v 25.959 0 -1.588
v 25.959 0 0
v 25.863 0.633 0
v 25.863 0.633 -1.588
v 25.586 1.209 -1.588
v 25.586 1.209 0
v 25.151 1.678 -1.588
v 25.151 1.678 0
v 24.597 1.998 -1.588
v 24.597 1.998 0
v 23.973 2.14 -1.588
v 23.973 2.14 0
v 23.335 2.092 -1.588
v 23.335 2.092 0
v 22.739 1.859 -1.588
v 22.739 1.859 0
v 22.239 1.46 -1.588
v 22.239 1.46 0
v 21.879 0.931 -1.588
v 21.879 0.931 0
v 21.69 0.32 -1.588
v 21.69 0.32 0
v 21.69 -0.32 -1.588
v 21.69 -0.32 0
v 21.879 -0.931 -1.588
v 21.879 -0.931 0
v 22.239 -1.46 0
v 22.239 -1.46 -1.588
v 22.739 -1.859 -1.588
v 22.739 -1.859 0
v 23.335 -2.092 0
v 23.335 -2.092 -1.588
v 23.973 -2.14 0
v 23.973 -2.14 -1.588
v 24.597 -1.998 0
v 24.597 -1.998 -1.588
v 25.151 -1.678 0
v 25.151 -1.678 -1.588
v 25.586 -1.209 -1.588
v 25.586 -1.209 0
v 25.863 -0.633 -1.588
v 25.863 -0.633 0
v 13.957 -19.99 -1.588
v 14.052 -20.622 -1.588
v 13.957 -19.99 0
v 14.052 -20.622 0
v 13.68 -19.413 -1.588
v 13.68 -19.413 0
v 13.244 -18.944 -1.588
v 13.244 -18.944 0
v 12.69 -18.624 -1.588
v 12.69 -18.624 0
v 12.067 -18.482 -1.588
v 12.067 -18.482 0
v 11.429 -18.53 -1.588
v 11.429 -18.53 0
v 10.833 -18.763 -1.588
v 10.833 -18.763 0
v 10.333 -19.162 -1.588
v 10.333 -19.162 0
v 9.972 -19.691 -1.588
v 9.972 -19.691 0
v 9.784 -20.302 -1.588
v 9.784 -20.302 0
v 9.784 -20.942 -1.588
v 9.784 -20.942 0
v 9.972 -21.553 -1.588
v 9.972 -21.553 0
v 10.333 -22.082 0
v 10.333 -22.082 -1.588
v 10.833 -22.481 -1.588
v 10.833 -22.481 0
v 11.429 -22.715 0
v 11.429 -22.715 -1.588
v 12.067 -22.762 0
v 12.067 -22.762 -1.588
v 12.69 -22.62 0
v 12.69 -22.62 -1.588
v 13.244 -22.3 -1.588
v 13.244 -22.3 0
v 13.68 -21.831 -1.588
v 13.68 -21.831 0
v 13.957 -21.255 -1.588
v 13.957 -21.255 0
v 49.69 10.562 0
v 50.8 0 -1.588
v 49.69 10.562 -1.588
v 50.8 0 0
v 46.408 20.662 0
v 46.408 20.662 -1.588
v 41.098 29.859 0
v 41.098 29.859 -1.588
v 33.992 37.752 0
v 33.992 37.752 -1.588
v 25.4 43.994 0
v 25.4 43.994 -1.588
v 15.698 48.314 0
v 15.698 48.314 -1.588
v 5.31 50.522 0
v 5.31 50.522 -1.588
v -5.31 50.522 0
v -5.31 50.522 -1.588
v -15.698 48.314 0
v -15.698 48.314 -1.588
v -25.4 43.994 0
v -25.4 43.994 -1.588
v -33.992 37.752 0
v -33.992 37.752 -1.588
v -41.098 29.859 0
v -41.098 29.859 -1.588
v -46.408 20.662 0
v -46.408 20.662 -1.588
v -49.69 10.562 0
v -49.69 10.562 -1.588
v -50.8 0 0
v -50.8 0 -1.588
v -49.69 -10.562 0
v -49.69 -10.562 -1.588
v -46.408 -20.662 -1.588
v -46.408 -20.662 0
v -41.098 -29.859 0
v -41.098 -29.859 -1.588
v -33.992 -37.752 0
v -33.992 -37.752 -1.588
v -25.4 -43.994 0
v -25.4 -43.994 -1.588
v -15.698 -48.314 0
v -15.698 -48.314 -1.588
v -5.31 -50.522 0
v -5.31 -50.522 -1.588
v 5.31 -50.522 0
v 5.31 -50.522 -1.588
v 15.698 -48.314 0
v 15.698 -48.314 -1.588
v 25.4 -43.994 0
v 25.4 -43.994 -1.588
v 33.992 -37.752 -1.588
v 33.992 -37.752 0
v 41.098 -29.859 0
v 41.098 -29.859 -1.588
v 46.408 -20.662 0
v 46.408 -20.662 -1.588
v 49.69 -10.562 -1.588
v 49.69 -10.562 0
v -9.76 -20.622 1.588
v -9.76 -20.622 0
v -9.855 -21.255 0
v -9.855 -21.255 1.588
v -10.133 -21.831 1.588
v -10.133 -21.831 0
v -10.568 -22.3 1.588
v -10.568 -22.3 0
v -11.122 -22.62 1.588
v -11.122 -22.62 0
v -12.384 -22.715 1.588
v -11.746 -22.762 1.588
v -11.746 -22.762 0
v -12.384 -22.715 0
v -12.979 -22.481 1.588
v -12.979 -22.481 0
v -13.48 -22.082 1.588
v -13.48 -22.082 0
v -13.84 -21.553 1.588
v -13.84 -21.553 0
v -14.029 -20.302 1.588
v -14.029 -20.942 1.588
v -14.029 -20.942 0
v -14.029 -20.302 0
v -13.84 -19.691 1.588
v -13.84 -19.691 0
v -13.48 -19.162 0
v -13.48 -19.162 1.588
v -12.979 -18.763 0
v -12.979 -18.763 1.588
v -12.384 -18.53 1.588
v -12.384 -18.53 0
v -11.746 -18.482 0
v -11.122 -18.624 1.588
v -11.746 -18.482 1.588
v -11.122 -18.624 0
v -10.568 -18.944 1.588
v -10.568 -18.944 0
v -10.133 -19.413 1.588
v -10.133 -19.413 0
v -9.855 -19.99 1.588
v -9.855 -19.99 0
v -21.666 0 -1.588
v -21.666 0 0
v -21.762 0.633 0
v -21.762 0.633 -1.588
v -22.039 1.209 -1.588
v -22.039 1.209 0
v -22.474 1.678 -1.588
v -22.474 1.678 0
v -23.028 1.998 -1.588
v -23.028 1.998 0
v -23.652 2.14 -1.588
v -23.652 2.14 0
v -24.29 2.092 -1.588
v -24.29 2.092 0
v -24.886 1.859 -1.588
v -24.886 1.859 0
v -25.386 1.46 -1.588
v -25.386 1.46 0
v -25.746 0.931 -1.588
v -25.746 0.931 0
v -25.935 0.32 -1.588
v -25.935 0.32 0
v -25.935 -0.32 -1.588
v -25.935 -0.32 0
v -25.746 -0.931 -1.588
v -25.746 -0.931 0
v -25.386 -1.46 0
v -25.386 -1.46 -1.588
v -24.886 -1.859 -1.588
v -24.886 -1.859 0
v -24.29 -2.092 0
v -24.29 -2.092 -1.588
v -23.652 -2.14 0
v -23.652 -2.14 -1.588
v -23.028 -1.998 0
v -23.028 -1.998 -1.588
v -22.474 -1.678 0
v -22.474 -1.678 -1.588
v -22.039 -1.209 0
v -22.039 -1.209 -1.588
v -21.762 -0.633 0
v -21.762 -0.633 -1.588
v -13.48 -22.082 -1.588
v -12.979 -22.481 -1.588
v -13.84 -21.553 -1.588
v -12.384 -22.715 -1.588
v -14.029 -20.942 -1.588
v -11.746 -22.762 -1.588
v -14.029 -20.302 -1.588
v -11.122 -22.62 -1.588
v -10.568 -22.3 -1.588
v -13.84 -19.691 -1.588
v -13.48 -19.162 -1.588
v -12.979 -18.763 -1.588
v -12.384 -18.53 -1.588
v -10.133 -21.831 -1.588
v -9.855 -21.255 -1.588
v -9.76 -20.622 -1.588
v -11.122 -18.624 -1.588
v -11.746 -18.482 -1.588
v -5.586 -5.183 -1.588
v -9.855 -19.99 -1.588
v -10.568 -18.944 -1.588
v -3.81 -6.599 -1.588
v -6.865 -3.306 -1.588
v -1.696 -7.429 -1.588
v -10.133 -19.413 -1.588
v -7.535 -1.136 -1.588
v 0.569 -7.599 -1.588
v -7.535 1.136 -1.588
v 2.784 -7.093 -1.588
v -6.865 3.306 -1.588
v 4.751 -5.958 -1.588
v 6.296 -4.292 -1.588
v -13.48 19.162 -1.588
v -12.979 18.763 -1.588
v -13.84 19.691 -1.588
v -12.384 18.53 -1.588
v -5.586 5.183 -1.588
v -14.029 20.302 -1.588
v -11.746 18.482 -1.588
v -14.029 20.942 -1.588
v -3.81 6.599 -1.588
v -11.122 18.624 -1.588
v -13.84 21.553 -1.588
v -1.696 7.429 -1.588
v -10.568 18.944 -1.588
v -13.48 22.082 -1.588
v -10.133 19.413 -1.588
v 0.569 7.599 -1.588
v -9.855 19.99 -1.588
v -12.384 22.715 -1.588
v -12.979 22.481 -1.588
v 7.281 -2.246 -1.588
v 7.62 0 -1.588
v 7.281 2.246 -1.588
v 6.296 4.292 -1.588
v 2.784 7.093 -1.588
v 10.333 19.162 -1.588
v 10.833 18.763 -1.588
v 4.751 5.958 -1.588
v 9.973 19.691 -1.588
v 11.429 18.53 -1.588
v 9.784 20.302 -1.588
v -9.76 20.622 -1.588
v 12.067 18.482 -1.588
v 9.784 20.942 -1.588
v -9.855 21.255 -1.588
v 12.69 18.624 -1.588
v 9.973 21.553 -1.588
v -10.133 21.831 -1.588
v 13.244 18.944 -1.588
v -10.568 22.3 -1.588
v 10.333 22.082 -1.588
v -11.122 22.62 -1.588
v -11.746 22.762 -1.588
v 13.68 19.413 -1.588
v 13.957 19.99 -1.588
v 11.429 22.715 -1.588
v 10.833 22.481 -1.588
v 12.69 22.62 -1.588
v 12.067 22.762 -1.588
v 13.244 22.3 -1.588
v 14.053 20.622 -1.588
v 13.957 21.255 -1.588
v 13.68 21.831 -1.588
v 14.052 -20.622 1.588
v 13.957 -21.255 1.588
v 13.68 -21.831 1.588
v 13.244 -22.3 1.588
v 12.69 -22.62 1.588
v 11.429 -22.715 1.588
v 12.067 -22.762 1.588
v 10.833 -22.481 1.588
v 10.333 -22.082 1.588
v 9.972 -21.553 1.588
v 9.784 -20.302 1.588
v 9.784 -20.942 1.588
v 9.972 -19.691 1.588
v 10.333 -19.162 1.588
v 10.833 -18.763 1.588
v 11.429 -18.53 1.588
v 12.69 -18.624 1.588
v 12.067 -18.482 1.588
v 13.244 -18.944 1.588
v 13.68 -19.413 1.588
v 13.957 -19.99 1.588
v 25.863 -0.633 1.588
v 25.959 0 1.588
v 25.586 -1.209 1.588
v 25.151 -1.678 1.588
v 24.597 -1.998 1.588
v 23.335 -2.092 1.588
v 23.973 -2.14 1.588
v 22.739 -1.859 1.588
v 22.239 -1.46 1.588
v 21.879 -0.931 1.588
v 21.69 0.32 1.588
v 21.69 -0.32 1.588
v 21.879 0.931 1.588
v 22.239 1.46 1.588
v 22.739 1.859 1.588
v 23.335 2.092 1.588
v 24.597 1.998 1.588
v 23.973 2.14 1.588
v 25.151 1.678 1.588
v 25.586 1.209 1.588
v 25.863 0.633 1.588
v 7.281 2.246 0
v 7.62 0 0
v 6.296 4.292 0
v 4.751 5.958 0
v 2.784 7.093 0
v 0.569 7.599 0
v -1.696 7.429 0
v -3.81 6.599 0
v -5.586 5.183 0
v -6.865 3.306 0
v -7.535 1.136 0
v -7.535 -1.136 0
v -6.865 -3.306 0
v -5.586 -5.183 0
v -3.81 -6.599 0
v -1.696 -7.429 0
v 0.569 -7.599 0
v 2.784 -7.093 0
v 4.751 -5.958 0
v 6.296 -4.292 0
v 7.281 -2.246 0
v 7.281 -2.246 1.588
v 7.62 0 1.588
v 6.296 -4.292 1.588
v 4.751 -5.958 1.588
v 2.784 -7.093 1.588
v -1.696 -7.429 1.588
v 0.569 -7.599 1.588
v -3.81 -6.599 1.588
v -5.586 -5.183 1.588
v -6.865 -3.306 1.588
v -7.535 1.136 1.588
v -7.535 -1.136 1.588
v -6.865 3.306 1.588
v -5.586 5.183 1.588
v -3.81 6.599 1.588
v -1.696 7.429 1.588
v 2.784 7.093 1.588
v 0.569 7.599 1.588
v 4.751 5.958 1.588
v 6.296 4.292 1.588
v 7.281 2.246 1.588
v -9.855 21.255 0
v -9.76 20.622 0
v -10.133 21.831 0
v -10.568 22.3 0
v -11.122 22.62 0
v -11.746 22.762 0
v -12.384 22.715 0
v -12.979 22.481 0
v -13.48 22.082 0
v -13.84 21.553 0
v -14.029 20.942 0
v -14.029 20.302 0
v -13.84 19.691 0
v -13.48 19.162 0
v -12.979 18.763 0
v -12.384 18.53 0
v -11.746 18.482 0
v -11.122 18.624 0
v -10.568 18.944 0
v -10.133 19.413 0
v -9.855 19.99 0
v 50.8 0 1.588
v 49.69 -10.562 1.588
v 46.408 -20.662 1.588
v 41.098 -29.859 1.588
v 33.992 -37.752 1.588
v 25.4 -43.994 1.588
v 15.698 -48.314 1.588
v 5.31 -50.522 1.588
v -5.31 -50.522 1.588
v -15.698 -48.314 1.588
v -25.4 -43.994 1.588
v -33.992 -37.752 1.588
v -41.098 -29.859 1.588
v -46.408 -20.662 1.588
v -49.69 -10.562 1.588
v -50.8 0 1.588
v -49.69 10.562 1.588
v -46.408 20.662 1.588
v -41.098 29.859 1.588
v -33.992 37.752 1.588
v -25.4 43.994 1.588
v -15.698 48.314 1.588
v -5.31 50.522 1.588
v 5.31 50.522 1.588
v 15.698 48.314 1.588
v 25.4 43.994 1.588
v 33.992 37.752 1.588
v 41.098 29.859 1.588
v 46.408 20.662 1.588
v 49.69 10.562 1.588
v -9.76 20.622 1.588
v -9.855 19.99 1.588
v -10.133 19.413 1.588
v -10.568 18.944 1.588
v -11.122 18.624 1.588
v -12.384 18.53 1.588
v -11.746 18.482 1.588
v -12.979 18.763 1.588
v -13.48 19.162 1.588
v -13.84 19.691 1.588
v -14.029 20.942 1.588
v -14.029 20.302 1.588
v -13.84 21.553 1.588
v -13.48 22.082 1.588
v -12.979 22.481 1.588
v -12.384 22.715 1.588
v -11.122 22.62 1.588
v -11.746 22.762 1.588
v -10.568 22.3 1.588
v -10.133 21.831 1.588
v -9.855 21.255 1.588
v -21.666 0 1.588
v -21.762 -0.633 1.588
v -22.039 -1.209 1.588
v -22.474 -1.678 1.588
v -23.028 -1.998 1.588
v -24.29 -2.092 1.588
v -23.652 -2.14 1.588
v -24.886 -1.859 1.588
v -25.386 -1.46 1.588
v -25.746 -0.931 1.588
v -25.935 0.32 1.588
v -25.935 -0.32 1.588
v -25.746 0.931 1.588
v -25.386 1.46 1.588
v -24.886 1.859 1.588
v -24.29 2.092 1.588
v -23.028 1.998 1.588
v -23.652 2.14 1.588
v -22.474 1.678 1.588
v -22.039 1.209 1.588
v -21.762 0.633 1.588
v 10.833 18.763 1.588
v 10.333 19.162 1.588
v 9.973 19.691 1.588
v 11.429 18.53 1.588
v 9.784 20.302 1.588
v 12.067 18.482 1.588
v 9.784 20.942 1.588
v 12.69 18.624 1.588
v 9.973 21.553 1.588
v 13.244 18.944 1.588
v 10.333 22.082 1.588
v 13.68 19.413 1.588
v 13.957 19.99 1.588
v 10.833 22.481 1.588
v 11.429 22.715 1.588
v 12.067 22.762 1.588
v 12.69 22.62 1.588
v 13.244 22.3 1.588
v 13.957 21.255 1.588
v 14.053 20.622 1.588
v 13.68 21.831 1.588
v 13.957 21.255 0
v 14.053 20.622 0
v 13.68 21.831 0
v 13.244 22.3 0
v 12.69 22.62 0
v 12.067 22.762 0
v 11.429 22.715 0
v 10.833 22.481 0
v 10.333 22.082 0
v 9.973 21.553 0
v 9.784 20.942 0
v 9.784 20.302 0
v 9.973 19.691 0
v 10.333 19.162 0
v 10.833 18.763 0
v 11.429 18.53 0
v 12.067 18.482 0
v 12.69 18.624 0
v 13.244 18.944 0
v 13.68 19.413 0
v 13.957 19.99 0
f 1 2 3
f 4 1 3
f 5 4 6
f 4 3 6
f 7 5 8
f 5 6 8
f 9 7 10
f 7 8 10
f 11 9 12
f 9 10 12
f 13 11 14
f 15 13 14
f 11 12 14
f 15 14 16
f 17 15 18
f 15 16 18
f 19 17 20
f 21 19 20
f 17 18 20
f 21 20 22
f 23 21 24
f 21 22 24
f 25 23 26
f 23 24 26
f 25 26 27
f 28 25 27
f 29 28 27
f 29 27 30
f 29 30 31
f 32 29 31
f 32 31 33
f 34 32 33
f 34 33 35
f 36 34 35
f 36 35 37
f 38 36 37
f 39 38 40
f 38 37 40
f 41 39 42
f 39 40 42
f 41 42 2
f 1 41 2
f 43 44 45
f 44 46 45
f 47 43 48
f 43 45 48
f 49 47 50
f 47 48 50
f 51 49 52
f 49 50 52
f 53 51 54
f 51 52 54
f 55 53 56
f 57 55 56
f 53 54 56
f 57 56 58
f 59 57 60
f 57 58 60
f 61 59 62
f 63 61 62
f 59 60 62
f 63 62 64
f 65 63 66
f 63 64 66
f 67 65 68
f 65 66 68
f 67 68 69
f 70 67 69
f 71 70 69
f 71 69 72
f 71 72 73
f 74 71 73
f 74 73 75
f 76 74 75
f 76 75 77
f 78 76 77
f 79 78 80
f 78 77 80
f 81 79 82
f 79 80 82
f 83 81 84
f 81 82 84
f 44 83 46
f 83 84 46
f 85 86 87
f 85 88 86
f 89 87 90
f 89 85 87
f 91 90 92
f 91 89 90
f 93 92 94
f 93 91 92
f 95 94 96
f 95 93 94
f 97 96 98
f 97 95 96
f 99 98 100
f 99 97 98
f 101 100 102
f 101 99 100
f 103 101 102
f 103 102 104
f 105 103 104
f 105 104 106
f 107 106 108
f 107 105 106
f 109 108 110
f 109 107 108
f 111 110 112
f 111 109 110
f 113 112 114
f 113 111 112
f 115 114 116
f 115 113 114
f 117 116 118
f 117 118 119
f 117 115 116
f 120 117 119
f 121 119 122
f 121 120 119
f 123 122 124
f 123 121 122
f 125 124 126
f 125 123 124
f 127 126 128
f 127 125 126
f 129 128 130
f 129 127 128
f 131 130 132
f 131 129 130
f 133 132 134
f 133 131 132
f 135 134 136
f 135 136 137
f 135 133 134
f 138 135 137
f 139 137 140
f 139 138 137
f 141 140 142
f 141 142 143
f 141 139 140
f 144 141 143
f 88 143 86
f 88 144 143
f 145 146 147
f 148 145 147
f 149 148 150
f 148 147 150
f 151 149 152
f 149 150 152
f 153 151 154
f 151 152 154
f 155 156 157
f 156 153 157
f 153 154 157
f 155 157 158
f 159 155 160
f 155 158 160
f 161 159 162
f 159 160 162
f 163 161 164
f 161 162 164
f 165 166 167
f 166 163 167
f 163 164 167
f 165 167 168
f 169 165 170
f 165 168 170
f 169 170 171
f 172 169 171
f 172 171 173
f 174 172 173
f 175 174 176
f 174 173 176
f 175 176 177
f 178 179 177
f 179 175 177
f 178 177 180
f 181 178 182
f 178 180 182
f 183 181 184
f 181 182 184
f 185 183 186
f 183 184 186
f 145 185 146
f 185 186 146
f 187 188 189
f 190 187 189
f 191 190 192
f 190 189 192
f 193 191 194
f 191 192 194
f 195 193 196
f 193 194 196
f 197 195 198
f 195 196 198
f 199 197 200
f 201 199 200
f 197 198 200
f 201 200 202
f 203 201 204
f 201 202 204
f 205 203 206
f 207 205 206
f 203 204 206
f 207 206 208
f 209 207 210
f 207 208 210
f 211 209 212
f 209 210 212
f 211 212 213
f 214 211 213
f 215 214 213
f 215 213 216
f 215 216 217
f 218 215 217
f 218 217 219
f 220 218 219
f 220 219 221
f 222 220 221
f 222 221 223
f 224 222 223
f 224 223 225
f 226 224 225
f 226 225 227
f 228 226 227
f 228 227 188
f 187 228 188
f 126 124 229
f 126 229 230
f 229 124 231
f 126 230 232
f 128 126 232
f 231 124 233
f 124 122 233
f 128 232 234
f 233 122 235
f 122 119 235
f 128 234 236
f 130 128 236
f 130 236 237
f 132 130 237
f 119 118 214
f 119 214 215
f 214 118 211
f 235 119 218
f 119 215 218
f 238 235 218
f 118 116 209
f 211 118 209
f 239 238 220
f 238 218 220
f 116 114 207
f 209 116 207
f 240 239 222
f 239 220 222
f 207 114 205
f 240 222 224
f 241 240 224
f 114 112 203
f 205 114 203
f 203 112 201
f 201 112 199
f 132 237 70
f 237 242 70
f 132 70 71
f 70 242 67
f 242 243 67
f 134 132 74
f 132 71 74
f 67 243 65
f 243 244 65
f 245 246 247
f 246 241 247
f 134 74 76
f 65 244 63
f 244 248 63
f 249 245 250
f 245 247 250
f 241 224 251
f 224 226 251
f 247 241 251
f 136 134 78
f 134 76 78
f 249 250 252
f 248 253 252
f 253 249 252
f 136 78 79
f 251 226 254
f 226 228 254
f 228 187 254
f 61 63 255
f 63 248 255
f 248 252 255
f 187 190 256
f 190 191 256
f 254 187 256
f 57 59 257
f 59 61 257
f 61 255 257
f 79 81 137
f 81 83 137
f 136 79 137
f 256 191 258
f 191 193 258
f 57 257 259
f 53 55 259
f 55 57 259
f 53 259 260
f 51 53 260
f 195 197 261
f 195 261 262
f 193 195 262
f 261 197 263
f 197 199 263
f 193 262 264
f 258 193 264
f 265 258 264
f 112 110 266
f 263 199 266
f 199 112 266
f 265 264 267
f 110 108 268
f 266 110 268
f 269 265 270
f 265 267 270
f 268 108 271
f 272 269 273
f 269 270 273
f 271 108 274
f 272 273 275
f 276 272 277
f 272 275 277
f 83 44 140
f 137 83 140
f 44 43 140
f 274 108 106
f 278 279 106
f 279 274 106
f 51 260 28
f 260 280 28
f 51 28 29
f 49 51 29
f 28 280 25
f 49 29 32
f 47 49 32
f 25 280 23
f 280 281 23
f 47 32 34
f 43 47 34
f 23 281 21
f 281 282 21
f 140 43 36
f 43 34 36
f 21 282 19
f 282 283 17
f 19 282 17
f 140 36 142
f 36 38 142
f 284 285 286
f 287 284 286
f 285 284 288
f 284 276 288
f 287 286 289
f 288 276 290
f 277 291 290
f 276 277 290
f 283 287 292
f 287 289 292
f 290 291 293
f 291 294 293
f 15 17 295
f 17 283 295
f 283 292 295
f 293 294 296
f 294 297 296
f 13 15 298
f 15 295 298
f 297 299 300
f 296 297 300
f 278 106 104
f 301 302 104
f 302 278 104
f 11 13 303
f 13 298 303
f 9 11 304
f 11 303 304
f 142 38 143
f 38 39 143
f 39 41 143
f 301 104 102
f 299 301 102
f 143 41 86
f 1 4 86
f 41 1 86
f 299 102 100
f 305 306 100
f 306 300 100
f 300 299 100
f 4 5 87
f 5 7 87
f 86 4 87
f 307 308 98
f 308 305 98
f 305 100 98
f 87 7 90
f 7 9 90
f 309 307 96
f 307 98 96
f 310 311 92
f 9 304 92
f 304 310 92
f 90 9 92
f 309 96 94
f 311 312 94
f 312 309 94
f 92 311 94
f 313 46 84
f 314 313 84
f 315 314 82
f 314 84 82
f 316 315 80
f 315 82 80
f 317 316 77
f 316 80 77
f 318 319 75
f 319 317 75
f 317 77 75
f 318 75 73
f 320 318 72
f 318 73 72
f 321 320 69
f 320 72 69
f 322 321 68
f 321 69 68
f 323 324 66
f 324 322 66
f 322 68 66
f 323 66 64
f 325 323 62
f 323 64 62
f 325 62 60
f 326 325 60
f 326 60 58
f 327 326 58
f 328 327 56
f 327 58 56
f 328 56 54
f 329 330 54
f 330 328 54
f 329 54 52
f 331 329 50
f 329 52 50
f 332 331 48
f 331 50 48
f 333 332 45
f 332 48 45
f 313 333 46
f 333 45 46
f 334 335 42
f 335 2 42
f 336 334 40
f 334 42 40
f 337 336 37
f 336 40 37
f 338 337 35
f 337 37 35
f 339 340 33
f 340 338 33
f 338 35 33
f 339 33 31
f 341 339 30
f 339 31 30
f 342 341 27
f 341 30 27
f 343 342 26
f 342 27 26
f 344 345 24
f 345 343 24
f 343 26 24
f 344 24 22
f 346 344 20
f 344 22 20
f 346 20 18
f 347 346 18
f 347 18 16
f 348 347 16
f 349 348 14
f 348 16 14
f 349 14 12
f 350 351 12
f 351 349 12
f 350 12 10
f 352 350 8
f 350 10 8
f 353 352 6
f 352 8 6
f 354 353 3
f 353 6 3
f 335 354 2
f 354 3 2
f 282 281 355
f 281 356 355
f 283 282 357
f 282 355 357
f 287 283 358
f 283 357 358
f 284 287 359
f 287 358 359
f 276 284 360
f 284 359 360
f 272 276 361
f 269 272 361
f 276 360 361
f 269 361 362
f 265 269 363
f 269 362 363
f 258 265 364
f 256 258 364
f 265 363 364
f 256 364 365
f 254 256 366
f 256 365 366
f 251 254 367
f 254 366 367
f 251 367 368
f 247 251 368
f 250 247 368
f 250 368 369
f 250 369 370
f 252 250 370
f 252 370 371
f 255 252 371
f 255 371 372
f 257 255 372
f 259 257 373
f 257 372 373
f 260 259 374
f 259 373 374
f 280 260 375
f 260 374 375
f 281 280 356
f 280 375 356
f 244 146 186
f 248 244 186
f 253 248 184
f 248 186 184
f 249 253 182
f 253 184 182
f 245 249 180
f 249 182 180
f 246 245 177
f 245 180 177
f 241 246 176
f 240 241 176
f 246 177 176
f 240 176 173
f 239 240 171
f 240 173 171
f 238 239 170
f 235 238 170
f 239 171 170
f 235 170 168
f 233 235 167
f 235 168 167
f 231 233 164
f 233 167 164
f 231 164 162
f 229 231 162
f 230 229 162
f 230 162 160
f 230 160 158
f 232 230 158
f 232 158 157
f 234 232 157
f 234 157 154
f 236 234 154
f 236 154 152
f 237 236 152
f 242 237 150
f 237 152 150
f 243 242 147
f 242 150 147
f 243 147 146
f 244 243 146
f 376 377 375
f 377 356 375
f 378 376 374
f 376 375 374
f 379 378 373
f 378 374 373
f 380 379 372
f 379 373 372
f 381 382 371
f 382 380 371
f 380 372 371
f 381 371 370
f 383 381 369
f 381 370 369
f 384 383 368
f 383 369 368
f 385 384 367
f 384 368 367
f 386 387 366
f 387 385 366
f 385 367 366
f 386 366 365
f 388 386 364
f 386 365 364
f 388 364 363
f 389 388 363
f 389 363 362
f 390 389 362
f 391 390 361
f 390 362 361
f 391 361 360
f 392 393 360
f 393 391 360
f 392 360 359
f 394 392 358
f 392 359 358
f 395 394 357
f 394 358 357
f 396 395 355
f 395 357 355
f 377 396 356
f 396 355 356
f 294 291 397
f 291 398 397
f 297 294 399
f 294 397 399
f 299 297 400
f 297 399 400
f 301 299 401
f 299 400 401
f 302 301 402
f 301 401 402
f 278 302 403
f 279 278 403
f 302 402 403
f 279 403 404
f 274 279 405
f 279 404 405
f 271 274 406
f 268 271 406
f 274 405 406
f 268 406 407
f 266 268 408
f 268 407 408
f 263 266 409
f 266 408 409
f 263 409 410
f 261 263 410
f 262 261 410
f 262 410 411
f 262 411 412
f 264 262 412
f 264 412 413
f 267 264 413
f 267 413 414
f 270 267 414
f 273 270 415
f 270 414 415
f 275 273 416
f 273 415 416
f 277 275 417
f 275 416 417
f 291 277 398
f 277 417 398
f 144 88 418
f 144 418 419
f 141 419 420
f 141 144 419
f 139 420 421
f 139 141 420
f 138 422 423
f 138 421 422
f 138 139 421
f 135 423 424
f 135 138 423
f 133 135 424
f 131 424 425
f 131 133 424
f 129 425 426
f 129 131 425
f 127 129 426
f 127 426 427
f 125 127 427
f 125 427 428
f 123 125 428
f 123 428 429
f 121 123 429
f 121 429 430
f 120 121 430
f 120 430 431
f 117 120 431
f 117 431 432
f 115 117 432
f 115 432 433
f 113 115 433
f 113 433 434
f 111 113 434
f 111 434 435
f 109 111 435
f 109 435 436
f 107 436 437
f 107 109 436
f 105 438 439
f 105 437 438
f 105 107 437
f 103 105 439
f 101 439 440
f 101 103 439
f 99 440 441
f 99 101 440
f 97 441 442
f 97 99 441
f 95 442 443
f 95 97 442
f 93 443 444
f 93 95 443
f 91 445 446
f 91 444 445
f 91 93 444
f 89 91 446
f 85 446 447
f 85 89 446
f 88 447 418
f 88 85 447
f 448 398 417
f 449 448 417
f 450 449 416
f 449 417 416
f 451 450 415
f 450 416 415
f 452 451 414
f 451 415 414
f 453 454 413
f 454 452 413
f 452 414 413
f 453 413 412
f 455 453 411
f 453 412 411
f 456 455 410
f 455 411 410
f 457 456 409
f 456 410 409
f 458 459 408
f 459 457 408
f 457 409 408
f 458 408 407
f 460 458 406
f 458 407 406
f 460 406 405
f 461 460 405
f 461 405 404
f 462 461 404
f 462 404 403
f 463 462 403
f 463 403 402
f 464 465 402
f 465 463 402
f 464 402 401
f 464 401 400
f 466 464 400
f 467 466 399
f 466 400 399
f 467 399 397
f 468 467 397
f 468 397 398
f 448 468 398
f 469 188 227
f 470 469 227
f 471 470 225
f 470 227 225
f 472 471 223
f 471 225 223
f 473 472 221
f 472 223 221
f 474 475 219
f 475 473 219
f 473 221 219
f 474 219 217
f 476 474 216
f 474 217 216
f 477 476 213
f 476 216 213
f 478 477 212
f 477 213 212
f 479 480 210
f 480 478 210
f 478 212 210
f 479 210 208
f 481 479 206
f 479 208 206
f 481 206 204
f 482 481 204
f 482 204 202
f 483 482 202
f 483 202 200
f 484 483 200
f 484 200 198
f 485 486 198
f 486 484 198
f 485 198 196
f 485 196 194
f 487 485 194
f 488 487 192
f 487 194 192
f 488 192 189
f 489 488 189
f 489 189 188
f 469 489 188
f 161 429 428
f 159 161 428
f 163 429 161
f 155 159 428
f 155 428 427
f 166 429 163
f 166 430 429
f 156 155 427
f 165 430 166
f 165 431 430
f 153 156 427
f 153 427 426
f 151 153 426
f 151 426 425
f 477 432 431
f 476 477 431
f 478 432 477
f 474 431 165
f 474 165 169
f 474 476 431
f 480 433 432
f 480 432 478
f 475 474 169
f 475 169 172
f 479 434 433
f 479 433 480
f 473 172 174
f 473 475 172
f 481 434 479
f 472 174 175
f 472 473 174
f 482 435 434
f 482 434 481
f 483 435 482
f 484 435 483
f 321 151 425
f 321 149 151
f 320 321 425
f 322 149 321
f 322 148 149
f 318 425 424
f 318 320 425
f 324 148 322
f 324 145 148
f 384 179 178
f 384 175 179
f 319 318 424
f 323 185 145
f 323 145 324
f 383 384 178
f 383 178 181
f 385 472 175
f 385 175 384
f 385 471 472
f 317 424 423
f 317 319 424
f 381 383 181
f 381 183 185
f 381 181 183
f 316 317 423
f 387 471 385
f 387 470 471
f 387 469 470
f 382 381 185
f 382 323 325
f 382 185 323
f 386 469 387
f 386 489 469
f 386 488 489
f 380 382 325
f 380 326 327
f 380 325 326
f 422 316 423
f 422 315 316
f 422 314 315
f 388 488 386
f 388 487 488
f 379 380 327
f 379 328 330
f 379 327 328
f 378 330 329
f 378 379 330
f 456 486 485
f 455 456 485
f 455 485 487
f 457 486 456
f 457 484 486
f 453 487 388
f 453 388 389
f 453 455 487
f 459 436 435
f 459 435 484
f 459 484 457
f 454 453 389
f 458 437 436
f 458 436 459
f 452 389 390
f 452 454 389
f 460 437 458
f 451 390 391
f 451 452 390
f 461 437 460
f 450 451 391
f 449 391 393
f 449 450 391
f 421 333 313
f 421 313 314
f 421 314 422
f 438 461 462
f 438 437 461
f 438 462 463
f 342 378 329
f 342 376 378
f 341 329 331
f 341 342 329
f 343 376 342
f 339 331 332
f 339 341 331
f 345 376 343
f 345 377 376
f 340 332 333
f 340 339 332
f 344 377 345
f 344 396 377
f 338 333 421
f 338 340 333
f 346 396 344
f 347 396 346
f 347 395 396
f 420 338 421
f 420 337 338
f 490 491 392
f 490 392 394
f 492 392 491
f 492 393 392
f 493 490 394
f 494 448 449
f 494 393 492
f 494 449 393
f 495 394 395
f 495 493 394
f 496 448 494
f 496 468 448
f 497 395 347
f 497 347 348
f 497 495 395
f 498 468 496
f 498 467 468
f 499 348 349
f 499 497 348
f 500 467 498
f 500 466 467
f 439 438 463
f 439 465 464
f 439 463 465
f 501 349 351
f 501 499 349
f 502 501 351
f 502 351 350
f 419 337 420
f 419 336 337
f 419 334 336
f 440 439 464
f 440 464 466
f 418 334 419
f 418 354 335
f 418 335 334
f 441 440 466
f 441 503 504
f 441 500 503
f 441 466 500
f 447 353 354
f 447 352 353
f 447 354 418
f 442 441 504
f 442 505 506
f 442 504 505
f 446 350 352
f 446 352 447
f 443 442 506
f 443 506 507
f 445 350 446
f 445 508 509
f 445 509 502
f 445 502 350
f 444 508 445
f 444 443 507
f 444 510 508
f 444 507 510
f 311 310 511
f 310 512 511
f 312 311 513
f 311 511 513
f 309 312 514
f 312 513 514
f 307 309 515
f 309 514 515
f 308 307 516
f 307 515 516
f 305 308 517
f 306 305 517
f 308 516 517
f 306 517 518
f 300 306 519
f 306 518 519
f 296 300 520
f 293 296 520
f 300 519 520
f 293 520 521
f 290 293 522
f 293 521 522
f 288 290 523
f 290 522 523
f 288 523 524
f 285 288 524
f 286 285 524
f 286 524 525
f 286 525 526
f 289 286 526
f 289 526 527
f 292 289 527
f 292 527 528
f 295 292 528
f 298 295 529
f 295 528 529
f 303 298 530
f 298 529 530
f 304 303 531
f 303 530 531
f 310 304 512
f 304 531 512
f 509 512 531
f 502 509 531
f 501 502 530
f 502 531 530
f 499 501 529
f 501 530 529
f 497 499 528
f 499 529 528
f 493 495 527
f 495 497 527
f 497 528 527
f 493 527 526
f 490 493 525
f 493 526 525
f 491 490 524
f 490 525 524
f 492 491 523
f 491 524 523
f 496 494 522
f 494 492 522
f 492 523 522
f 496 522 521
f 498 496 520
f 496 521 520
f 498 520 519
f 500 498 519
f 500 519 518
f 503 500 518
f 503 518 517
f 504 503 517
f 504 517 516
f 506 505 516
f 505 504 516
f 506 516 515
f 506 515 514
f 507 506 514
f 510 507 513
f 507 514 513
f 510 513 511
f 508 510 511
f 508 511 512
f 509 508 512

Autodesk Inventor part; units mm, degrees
ref_plane "YZ Plane" through (0, 0, 0) normal (1, 0, 0) x (0, 1, 0)
ref_plane "XZ Plane" through (0, 0, 0) normal (0, 1, 0) x (-1, 0, 0)
ref_plane "XY Plane" through (0, 0, 0) normal (0, 0, 1) x (1, 0, 0)
sketch "Sketch1" plane through (0, 0, 0) normal (0, 0, 1) x (1, 0, 0)
  circle A0 centre (23.8125, 0) radius 2.1463
  circle A1 centre (11.9063, 20.6222) radius 2.1463
  circle A2 centre (-11.9062, 20.6222) radius 2.1463
  circle A3 centre (-23.8125, 0) radius 2.1463
  circle A4 centre (-11.9063, -20.6222) radius 2.1463
  circle A5 centre (11.9062, -20.6222) radius 2.1463
  circle A6 centre (0, 0) radius 50.8
  circle A7 centre (0, 0) radius 7.62
  dimension "d0" = 4.2926
  dimension "d4" = 360
  dimension "d6" = 101.6
  dimension "d9" = 15.24
extrude "Extrusion1" add sketch "Sketch1" along normal mid plane 3.175
properties part number "Spool Plate" material "Aluminum 6061"
